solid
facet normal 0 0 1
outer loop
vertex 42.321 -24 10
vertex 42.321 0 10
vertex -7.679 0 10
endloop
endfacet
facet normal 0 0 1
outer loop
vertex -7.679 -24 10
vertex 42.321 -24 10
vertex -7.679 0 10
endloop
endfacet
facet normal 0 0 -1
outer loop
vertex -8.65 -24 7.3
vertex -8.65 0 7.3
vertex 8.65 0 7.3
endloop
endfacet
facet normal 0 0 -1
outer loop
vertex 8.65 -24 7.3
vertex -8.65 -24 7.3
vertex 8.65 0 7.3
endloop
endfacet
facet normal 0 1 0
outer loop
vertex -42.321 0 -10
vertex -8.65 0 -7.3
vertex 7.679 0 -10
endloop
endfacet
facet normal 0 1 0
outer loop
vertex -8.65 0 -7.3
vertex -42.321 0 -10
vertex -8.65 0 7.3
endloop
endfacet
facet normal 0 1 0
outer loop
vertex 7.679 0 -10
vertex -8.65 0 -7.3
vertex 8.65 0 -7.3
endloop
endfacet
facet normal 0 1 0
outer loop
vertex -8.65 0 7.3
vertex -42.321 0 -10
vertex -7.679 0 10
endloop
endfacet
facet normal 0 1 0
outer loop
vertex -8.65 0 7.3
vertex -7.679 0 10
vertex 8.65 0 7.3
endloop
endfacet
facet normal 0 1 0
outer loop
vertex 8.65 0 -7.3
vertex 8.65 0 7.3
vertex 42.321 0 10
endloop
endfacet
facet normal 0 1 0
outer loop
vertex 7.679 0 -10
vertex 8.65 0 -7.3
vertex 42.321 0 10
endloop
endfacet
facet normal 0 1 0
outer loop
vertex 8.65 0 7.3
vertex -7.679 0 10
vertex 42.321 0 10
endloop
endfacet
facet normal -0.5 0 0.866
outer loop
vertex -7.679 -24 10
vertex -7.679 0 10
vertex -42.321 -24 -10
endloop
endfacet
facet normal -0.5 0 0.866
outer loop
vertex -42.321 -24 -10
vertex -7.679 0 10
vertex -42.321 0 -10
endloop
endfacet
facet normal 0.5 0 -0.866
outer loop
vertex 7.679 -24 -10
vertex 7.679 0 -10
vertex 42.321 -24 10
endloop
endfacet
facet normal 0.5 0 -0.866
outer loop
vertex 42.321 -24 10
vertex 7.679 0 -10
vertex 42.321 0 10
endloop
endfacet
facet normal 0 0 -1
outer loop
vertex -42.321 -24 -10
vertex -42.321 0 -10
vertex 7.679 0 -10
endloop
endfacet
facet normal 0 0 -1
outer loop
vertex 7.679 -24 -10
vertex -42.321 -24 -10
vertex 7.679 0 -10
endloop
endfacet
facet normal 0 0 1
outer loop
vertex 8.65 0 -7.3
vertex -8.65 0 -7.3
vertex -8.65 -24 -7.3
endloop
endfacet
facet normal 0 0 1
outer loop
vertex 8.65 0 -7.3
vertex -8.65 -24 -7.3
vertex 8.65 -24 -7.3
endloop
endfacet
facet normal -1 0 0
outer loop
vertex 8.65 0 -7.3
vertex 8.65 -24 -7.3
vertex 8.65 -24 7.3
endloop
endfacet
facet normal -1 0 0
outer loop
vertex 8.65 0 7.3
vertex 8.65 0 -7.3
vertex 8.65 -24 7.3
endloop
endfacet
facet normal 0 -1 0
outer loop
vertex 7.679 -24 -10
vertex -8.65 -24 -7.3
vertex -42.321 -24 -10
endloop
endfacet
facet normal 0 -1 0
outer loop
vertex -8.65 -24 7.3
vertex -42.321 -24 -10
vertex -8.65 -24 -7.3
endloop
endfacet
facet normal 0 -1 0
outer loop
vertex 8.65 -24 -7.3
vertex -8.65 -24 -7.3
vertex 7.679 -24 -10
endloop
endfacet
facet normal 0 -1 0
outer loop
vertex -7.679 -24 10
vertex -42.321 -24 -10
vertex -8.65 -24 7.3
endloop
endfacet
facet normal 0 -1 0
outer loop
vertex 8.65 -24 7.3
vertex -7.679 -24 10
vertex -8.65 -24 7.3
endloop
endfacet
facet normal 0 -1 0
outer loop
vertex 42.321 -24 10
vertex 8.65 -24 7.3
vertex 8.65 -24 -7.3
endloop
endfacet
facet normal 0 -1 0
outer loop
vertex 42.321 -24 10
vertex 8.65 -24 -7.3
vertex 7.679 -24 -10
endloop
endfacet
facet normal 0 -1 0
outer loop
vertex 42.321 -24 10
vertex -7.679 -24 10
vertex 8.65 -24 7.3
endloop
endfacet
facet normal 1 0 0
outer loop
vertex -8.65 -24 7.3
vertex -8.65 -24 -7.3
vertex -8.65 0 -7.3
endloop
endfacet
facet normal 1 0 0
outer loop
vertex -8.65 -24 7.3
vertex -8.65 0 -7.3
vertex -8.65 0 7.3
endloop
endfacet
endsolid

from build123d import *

# Parameters (mm, degrees)
F0_W     = 17.3
F0_H     = 14.6
F1_DEPTH = 24


with BuildPart() as f1:
    # F0 (on Front) → F1 (new body)
    with BuildSketch(Plane.XZ):
        Polygon((42.320508, 10), (-7.679492, 10), (-42.320508, -10), (7.679492, -10), align=None)
        Rectangle(F0_W, F0_H, mode=Mode.SUBTRACT)
    extrude(amount=F1_DEPTH)


solid = f1.part
